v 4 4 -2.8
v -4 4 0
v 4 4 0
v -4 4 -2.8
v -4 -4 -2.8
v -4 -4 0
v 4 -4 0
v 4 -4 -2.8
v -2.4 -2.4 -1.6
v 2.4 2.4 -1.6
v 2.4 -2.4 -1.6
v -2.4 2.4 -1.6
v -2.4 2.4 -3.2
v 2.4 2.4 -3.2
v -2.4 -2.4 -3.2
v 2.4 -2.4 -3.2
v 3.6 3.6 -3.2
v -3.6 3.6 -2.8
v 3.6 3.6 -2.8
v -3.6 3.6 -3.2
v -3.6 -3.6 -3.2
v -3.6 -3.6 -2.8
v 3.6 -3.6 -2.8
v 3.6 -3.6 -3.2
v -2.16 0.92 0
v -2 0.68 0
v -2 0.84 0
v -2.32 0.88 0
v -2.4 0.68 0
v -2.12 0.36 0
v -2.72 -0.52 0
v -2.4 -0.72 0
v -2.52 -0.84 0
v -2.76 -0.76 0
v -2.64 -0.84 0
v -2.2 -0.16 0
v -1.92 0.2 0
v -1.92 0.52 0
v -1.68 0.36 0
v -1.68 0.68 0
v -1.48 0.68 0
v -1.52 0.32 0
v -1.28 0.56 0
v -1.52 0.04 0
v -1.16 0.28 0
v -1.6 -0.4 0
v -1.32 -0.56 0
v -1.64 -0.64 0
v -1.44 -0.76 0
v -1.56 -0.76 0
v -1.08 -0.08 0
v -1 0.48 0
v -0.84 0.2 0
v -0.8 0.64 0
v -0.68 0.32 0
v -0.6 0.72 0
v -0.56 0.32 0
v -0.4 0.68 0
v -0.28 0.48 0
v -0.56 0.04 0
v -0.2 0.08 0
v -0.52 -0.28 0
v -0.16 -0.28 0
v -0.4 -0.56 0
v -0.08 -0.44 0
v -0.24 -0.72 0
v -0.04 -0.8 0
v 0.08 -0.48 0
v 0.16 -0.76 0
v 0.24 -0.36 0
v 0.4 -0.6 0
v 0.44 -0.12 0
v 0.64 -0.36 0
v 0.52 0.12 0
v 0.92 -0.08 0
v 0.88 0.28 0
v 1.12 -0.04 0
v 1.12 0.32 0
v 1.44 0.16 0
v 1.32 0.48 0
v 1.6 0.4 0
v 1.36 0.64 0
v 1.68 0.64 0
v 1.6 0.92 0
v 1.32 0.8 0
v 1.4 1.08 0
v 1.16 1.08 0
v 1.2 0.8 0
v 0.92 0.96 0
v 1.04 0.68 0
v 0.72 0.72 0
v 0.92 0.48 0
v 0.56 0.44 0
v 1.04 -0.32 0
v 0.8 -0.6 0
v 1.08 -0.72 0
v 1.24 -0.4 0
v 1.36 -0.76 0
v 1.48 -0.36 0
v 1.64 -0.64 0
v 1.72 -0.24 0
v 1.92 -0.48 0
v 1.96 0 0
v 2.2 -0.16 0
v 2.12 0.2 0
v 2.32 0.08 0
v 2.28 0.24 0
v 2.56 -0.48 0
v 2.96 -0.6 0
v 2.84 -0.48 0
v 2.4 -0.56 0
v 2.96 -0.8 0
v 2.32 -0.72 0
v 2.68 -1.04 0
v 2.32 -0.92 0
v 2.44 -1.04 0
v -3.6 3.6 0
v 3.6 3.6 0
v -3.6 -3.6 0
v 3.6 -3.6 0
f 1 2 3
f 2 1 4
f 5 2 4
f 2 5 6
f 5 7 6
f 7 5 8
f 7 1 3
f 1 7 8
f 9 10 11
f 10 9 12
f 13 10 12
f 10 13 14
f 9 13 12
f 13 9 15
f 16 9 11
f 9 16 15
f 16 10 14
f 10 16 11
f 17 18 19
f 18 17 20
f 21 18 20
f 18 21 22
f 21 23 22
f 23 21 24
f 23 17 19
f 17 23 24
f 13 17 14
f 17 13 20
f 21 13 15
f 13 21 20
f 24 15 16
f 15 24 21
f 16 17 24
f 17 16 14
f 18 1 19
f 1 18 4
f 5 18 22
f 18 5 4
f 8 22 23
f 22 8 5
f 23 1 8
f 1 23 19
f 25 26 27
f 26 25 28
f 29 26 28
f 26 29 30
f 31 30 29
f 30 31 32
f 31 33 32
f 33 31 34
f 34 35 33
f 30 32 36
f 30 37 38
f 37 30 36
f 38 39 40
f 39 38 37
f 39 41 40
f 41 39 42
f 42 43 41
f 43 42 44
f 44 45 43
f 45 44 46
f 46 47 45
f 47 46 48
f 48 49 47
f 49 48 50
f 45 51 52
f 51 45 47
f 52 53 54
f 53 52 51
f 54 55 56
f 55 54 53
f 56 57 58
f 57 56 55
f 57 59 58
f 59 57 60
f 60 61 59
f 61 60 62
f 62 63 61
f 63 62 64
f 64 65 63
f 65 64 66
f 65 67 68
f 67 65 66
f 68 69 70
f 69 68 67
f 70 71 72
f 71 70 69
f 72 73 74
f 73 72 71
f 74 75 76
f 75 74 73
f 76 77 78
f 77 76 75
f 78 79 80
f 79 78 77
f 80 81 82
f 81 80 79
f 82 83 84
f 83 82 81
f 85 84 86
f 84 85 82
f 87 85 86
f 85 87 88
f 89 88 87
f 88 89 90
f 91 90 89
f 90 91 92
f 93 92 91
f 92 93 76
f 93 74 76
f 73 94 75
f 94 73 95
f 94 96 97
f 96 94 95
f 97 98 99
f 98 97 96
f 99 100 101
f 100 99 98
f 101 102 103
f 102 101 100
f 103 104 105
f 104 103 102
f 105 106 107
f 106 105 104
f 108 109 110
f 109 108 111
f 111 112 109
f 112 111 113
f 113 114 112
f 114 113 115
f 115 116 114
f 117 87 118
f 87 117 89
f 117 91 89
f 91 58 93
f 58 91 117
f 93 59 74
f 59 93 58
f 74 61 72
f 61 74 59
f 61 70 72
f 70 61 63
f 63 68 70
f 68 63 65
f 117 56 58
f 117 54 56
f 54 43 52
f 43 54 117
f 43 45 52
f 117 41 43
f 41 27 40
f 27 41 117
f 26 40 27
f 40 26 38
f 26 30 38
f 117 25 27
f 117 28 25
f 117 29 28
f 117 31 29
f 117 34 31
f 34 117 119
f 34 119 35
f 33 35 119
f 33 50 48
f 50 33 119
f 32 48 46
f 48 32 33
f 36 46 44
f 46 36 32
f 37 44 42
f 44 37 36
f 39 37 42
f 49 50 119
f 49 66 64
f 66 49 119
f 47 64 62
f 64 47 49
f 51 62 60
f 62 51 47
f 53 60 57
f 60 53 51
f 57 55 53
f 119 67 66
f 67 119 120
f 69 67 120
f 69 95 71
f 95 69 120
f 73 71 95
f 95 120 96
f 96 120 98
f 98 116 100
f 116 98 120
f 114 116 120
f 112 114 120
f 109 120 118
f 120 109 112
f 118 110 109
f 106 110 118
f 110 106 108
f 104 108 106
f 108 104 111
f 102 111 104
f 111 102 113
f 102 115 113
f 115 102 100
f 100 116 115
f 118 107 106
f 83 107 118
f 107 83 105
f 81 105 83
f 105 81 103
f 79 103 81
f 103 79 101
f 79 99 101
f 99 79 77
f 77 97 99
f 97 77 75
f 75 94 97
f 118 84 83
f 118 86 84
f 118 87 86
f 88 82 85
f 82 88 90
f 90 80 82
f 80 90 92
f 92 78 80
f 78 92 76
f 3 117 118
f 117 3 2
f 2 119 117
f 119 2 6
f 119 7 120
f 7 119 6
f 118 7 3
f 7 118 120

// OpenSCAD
// file: ../p/box5.scad
use <../lib.scad>
function ldraw_lib__box5() = [
// 0 Box with 5 Faces and All Edges
// 0 Name: box5.dat
// 0 Author: James Jessiman
// 0 !LDRAW_ORG Primitive UPDATE 2012-01
// 0 !LICENSE Licensed under CC BY 2.0 and CC BY 4.0 : see CAreadme.txt
// 
// 0 BFC CERTIFY CCW
  [0,"BFC","CERTIFY"],
  [0,"BFC","CCW"],
// 
// 0 !HISTORY 2002-04-03 [sbliss] Modified for BFC compliance
// 0 !HISTORY 2002-04-25 [PTadmin] Official Update 2002-02
// 0 !HISTORY 2007-06-24 [PTadmin] Header formatted for Contributor Agreement
// 0 !HISTORY 2008-07-01 [PTadmin] Official Update 2008-01
// 0 !HISTORY 2012-02-16 [Philo] Changed to CCW
// 0 !HISTORY 2012-03-30 [PTadmin] Official Update 2012-01
// 
// 
// 2 24 1 1 1 -1 1 1
  [2,24,1,1,1,-1,1,1],
// 2 24 -1 1 1 -1 1 -1
  [2,24,-1,1,1,-1,1,-1],
// 2 24 -1 1 -1 1 1 -1
  [2,24,-1,1,-1,1,1,-1],
// 2 24 1 1 -1 1 1 1
  [2,24,1,1,-1,1,1,1],
// 2 24 1 0 1 -1 0 1
  [2,24,1,0,1,-1,0,1],
// 2 24 -1 0 1 -1 0 -1
  [2,24,-1,0,1,-1,0,-1],
// 2 24 -1 0 -1 1 0 -1
  [2,24,-1,0,-1,1,0,-1],
// 2 24 1 0 -1 1 0 1
  [2,24,1,0,-1,1,0,1],
// 2 24 1 0 1 1 1 1
  [2,24,1,0,1,1,1,1],
// 2 24 -1 0 1 -1 1 1
  [2,24,-1,0,1,-1,1,1],
// 2 24 1 0 -1 1 1 -1
  [2,24,1,0,-1,1,1,-1],
// 2 24 -1 0 -1 -1 1 -1
  [2,24,-1,0,-1,-1,1,-1],
// 4 16 -1 1 1 1 1 1 1 1 -1 -1 1 -1
  [4,16,-1,1,1,1,1,1,1,1,-1,-1,1,-1],
// 4 16 -1 1 1 -1 0 1 1 0 1 1 1 1
  [4,16,-1,1,1,-1,0,1,1,0,1,1,1,1],
// 4 16 -1 1 -1 -1 0 -1 -1 0 1 -1 1 1
  [4,16,-1,1,-1,-1,0,-1,-1,0,1,-1,1,1],
// 4 16 1 1 -1 1 0 -1 -1 0 -1 -1 1 -1
  [4,16,1,1,-1,1,0,-1,-1,0,-1,-1,1,-1],
// 4 16 1 1 1 1 0 1 1 0 -1 1 1 -1
  [4,16,1,1,1,1,0,1,1,0,-1,1,1,-1],
];
makepoly(ldraw_lib__box5(), line=0.2);
// file: ../p/box4.scad
use <../lib.scad>
function ldraw_lib__box4() = [
// 0 Box with 4 Faces (2 Parallel Pairs) and All Edges
// 0 Name: box4.dat
// 0 Author: James Jessiman
// 0 !LDRAW_ORG Primitive UPDATE 2012-01
// 0 !LICENSE Licensed under CC BY 2.0 and CC BY 4.0 : see CAreadme.txt
// 
// 0 BFC CERTIFY CCW
  [0,"BFC","CERTIFY"],
  [0,"BFC","CCW"],
// 
// 0 !HISTORY 2002-04-03 [sbliss] Modified for BFC compliance
// 0 !HISTORY 2002-04-25 [PTadmin] Official Update 2002-02
// 0 !HISTORY 2007-06-24 [PTadmin] Header formatted for Contributor Agreement
// 0 !HISTORY 2008-07-01 [PTadmin] Official Update 2008-01
// 0 !HISTORY 2012-02-16 [Philo] Changed to CCW
// 0 !HISTORY 2012-03-30 [PTadmin] Official Update 2012-01
// 
// 
// 2 24 1 1 1 -1 1 1
  [2,24,1,1,1,-1,1,1],
// 2 24 -1 1 1 -1 1 -1
  [2,24,-1,1,1,-1,1,-1],
// 2 24 -1 1 -1 1 1 -1
  [2,24,-1,1,-1,1,1,-1],
// 2 24 1 1 -1 1 1 1
  [2,24,1,1,-1,1,1,1],
// 2 24 1 0 1 -1 0 1
  [2,24,1,0,1,-1,0,1],
// 2 24 -1 0 1 -1 0 -1
  [2,24,-1,0,1,-1,0,-1],
// 2 24 -1 0 -1 1 0 -1
  [2,24,-1,0,-1,1,0,-1],
// 2 24 1 0 -1 1 0 1
  [2,24,1,0,-1,1,0,1],
// 2 24 1 0 1 1 1 1
  [2,24,1,0,1,1,1,1],
// 2 24 -1 0 1 -1 1 1
  [2,24,-1,0,1,-1,1,1],
// 2 24 1 0 -1 1 1 -1
  [2,24,1,0,-1,1,1,-1],
// 2 24 -1 0 -1 -1 1 -1
  [2,24,-1,0,-1,-1,1,-1],
// 4 16 -1 1 1 -1 0 1 1 0 1 1 1 1
  [4,16,-1,1,1,-1,0,1,1,0,1,1,1,1],
// 4 16 -1 1 -1 -1 0 -1 -1 0 1 -1 1 1
  [4,16,-1,1,-1,-1,0,-1,-1,0,1,-1,1,1],
// 4 16 1 1 -1 1 0 -1 -1 0 -1 -1 1 -1
  [4,16,1,1,-1,1,0,-1,-1,0,-1,-1,1,-1],
// 4 16 1 1 1 1 0 1 1 0 -1 1 1 -1
  [4,16,1,1,1,1,0,1,1,0,-1,1,1,-1],
];
makepoly(ldraw_lib__box4(), line=0.2);
// file: s/3070bs01.scad
use <../../lib.scad>
use <../../p/box4.scad>
use <../../p/box5.scad>
function ldraw_lib__s__3070bs01() = [
// 0 ~Tile  1 x  1 with Groove without Top Face
// 0 Name: s\3070bs01.dat
// 0 Author: Chris Dee [cwdee]
// 0 !LDRAW_ORG Subpart UPDATE 2009-02
// 0 !LICENSE Licensed under CC BY 2.0 and CC BY 4.0 : see CAreadme.txt
// 
// 0 BFC CERTIFY CCW
  [0,"BFC","CERTIFY"],
  [0,"BFC","CCW"],
// 
// 0 !HISTORY 2009-09-03 [PTadmin] Official Update 2009-02
// 
// 
// 1 16 0 0 0 10 0 0 0 7 0 0 0 10 box4.dat
  [1,16,0,0,0,10,0,0,0,7,0,0,0,10, ldraw_lib__box4()],
// 0 BFC INVERTNEXT
  [0,"BFC","INVERTNEXT"],
// 1 16 0 8 0 6 0 0 0 -4 0 0 0 6 box5.dat
  [1,16,0,8,0,6,0,0,0,-4,0,0,0,6, ldraw_lib__box5()],
// 1 16 0 7 0 9 0 0 0 1 0 0 0 9 box4.dat
  [1,16,0,7,0,9,0,0,0,1,0,0,0,9, ldraw_lib__box4()],
// 
// 4 16 9 8 9 6 8 6 -6 8 6 -9 8 9
  [4,16,9,8,9,6,8,6,-6,8,6,-9,8,9],
// 4 16 -9 8 9 -6 8 6 -6 8 -6 -9 8 -9
  [4,16,-9,8,9,-6,8,6,-6,8,-6,-9,8,-9],
// 4 16 -9 8 -9 -6 8 -6 6 8 -6 9 8 -9
  [4,16,-9,8,-9,-6,8,-6,6,8,-6,9,8,-9],
// 4 16 9 8 -9 6 8 -6 6 8 6 9 8 9
  [4,16,9,8,-9,6,8,-6,6,8,6,9,8,9],
// 
// 4 16 10 7 10 9 7 9 -9 7 9 -10 7 10
  [4,16,10,7,10,9,7,9,-9,7,9,-10,7,10],
// 4 16 -10 7 10 -9 7 9 -9 7 -9 -10 7 -10
  [4,16,-10,7,10,-9,7,9,-9,7,-9,-10,7,-10],
// 4 16 -10 7 -10 -9 7 -9 9 7 -9 10 7 -10
  [4,16,-10,7,-10,-9,7,-9,9,7,-9,10,7,-10],
// 4 16 10 7 -10 9 7 -9 9 7 9 10 7 10
  [4,16,10,7,-10,9,7,-9,9,7,9,10,7,10],
// 0
];
makepoly(ldraw_lib__s__3070bs01(), line=0.2);
// main file
use <../lib.scad>
use <s/3070bs01.scad>
function ldraw_lib__3070bp14() = [
// 0 Tile  1 x  1 with Yellow "me." Script on Magenta Background Pattern
// 0 Name: 3070bp14.dat
// 0 Author: Takeshi Takahashi [RainbowDolphin]
// 0 !LDRAW_ORG Part UPDATE 2022-01
// 0 !LICENSE Licensed under CC BY 2.0 and CC BY 4.0 : see CAreadme.txt
// 
// 0 BFC CERTIFY CCW
  [0,"BFC","CERTIFY"],
  [0,"BFC","CCW"],
// 
// 0 !KEYWORDS Bricklink 3070bpb144, Dots, Set 41916
// 
// 0 !HISTORY 2022-01-14 [PTadmin] Official Update 2022-01
// 
// 
// 1 16 0 0 0 1 0 0 0 1 0 0 0 1 s\3070bs01.dat
  [1,16,0,0,0,1,0,0,0,1,0,0,0,1, ldraw_lib__s__3070bs01()],
// 4 14 -5 0 2.1 -5.4 0 2.3 -5.8 0 2.2 -5 0 1.7
  [4,14,-5,0,2.1,-5.4,0,2.3,-5.8,0,2.2,-5,0,1.7],
// 4 14 -5 0 1.7 -5.8 0 2.2 -6 0 1.7 -5.3 0 0.9
  [4,14,-5,0,1.7,-5.8,0,2.2,-6,0,1.7,-5.3,0,0.9],
// 4 14 -5.3 0 0.9 -6 0 1.7 -6.8 0 -1.3 -6 0 -1.8
  [4,14,-5.3,0,0.9,-6,0,1.7,-6.8,0,-1.3,-6,0,-1.8],
// 4 14 -6 0 -1.8 -6.8 0 -1.3 -6.9 0 -1.9 -6.3 0 -2.1
  [4,14,-6,0,-1.8,-6.8,0,-1.3,-6.9,0,-1.9,-6.3,0,-2.1],
// 3 14 -6.9 0 -1.9 -6.6 0 -2.1 -6.3 0 -2.1
  [3,14,-6.9,0,-1.9,-6.6,0,-2.1,-6.3,0,-2.1],
// 3 14 -5.3 0 0.9 -6 0 -1.8 -5.5 0 -0.4
  [3,14,-5.3,0,0.9,-6,0,-1.8,-5.5,0,-0.4],
// 4 14 -4.8 0 1.3 -5.3 0 0.9 -5.5 0 -0.4 -4.8 0 0.5
  [4,14,-4.8,0,1.3,-5.3,0,0.9,-5.5,0,-0.4,-4.8,0,0.5],
// 4 14 -4.2 0 1.7 -4.8 0 1.3 -4.8 0 0.5 -4.2 0 0.9
  [4,14,-4.2,0,1.7,-4.8,0,1.3,-4.8,0,0.5,-4.2,0,0.9],
// 4 14 -3.7 0 1.7 -4.2 0 1.7 -4.2 0 0.9 -3.8 0 0.8
  [4,14,-3.7,0,1.7,-4.2,0,1.7,-4.2,0,0.9,-3.8,0,0.8],
// 4 14 -3.2 0 1.4 -3.7 0 1.7 -3.8 0 0.8 -3.8 0 0.1
  [4,14,-3.2,0,1.4,-3.7,0,1.7,-3.8,0,0.8,-3.8,0,0.1],
// 4 14 -2.9 0 0.7 -3.2 0 1.4 -3.8 0 0.1 -4 0 -1
  [4,14,-2.9,0,0.7,-3.2,0,1.4,-3.8,0,0.1,-4,0,-1],
// 4 14 -3.3 0 -1.4 -2.9 0 0.7 -4 0 -1 -4.1 0 -1.6
  [4,14,-3.3,0,-1.4,-2.9,0,0.7,-4,0,-1,-4.1,0,-1.6],
// 4 14 -3.6 0 -1.9 -3.3 0 -1.4 -4.1 0 -1.6 -3.9 0 -1.9
  [4,14,-3.6,0,-1.9,-3.3,0,-1.4,-4.1,0,-1.6,-3.9,0,-1.9],
// 4 14 -2.9 0 0.7 -3.3 0 -1.4 -2.7 0 -0.2 -2.5 0 1.2
  [4,14,-2.9,0,0.7,-3.3,0,-1.4,-2.7,0,-0.2,-2.5,0,1.2],
// 4 14 -2.5 0 1.2 -2.7 0 -0.2 -2.1 0 0.5 -2 0 1.6
  [4,14,-2.5,0,1.2,-2.7,0,-0.2,-2.1,0,0.5,-2,0,1.6],
// 4 14 -2 0 1.6 -2.1 0 0.5 -1.7 0 0.8 -1.5 0 1.8
  [4,14,-2,0,1.6,-2.1,0,0.5,-1.7,0,0.8,-1.5,0,1.8],
// 4 14 -1.5 0 1.8 -1.7 0 0.8 -1.4 0 0.8 -1 0 1.7
  [4,14,-1.5,0,1.8,-1.7,0,0.8,-1.4,0,0.8,-1,0,1.7],
// 4 14 -0.7 0 1.2 -1 0 1.7 -1.4 0 0.8 -1.4 0 0.1
  [4,14,-0.7,0,1.2,-1,0,1.7,-1.4,0,0.8,-1.4,0,0.1],
// 4 14 -0.5 0 0.2 -0.7 0 1.2 -1.4 0 0.1 -1.3 0 -0.7
  [4,14,-0.5,0,0.2,-0.7,0,1.2,-1.4,0,0.1,-1.3,0,-0.7],
// 4 14 -0.4 0 -0.7 -0.5 0 0.2 -1.3 0 -0.7 -1 0 -1.4
  [4,14,-0.4,0,-0.7,-0.5,0,0.2,-1.3,0,-0.7,-1,0,-1.4],
// 4 14 -0.2 0 -1.1 -0.4 0 -0.7 -1 0 -1.4 -0.6 0 -1.8
  [4,14,-0.2,0,-1.1,-0.4,0,-0.7,-1,0,-1.4,-0.6,0,-1.8],
// 4 14 -0.2 0 -1.1 -0.6 0 -1.8 -0.1 0 -2 0.2 0 -1.2
  [4,14,-0.2,0,-1.1,-0.6,0,-1.8,-0.1,0,-2,0.2,0,-1.2],
// 4 14 0.2 0 -1.2 -0.1 0 -2 0.4 0 -1.9 0.6 0 -0.9
  [4,14,0.2,0,-1.2,-0.1,0,-2,0.4,0,-1.9,0.6,0,-0.9],
// 4 14 0.6 0 -0.9 0.4 0 -1.9 1 0 -1.5 1.1 0 -0.3
  [4,14,0.6,0,-0.9,0.4,0,-1.9,1,0,-1.5,1.1,0,-0.3],
// 4 14 1.1 0 -0.3 1 0 -1.5 1.6 0 -0.9 1.3 0 0.3
  [4,14,1.1,0,-0.3,1,0,-1.5,1.6,0,-0.9,1.3,0,0.3],
// 4 14 1.3 0 0.3 1.6 0 -0.9 2.3 0 -0.2 2.2 0 0.7
  [4,14,1.3,0,0.3,1.6,0,-0.9,2.3,0,-0.2,2.2,0,0.7],
// 4 14 2.2 0 0.7 2.3 0 -0.2 2.8 0 -0.1 2.8 0 0.8
  [4,14,2.2,0,0.7,2.3,0,-0.2,2.8,0,-0.1,2.8,0,0.8],
// 4 14 2.8 0 0.8 2.8 0 -0.1 3.6 0 0.4 3.3 0 1.2
  [4,14,2.8,0,0.8,2.8,0,-0.1,3.6,0,0.4,3.3,0,1.2],
// 4 14 3.3 0 1.2 3.6 0 0.4 4 0 1 3.4 0 1.6
  [4,14,3.3,0,1.2,3.6,0,0.4,4,0,1,3.4,0,1.6],
// 4 14 3.4 0 1.6 4 0 1 4.2 0 1.6 4 0 2.3
  [4,14,3.4,0,1.6,4,0,1,4.2,0,1.6,4,0,2.3],
// 4 14 3.3 0 2 3.4 0 1.6 4 0 2.3 3.5 0 2.7
  [4,14,3.3,0,2,3.4,0,1.6,4,0,2.3,3.5,0,2.7],
// 4 14 3 0 2 3.3 0 2 3.5 0 2.7 2.9 0 2.7
  [4,14,3,0,2,3.3,0,2,3.5,0,2.7,2.9,0,2.7],
// 4 14 3 0 2 2.9 0 2.7 2.3 0 2.4 2.6 0 1.7
  [4,14,3,0,2,2.9,0,2.7,2.3,0,2.4,2.6,0,1.7],
// 4 14 2.6 0 1.7 2.3 0 2.4 1.8 0 1.8 2.3 0 1.2
  [4,14,2.6,0,1.7,2.3,0,2.4,1.8,0,1.8,2.3,0,1.2],
// 4 14 2.3 0 1.2 1.8 0 1.8 1.4 0 1.1 2.2 0 0.7
  [4,14,2.3,0,1.2,1.8,0,1.8,1.4,0,1.1,2.2,0,0.7],
// 3 14 1.4 0 1.1 1.3 0 0.3 2.2 0 0.7
  [3,14,1.4,0,1.1,1.3,0,0.3,2.2,0,0.7],
// 4 14 2.3 0 -0.2 1.6 0 -0.9 2 0 -1.5 2.6 0 -0.8
  [4,14,2.3,0,-0.2,1.6,0,-0.9,2,0,-1.5,2.6,0,-0.8],
// 4 14 2.6 0 -0.8 2 0 -1.5 2.7 0 -1.8 3.1 0 -1
  [4,14,2.6,0,-0.8,2,0,-1.5,2.7,0,-1.8,3.1,0,-1],
// 4 14 3.1 0 -1 2.7 0 -1.8 3.4 0 -1.9 3.7 0 -0.9
  [4,14,3.1,0,-1,2.7,0,-1.8,3.4,0,-1.9,3.7,0,-0.9],
// 4 14 3.7 0 -0.9 3.4 0 -1.9 4.1 0 -1.6 4.3 0 -0.6
  [4,14,3.7,0,-0.9,3.4,0,-1.9,4.1,0,-1.6,4.3,0,-0.6],
// 4 14 4.3 0 -0.6 4.1 0 -1.6 4.8 0 -1.2 4.9 0 0
  [4,14,4.3,0,-0.6,4.1,0,-1.6,4.8,0,-1.2,4.9,0,0],
// 4 14 4.9 0 0 4.8 0 -1.2 5.5 0 -0.4 5.3 0 0.5
  [4,14,4.9,0,0,4.8,0,-1.2,5.5,0,-0.4,5.3,0,0.5],
// 4 14 5.3 0 0.5 5.5 0 -0.4 5.8 0 0.2 5.7 0 0.6
  [4,14,5.3,0,0.5,5.5,0,-0.4,5.8,0,0.2,5.7,0,0.6],
// 4 14 7.1 0 -1.2 6.4 0 -1.2 6 0 -1.4 7.4 0 -1.5
  [4,14,7.1,0,-1.2,6.4,0,-1.2,6,0,-1.4,7.4,0,-1.5],
// 4 14 7.4 0 -1.5 6 0 -1.4 5.8 0 -1.8 7.4 0 -2
  [4,14,7.4,0,-1.5,6,0,-1.4,5.8,0,-1.8,7.4,0,-2],
// 4 14 7.4 0 -2 5.8 0 -1.8 5.8 0 -2.3 6.7 0 -2.6
  [4,14,7.4,0,-2,5.8,0,-1.8,5.8,0,-2.3,6.7,0,-2.6],
// 3 14 5.8 0 -2.3 6.1 0 -2.6 6.7 0 -2.6
  [3,14,5.8,0,-2.3,6.1,0,-2.6,6.7,0,-2.6],
// 4 26 2.9 0 2.7 9 0 9 -9 0 9 2.3 0 2.4
  [4,26,2.9,0,2.7,9,0,9,-9,0,9,2.3,0,2.4],
// 3 26 -9 0 9 1.8 0 1.8 2.3 0 2.4
  [3,26,-9,0,9,1.8,0,1.8,2.3,0,2.4],
// 4 26 1.4 0 1.1 1.8 0 1.8 -9 0 9 -1 0 1.7
  [4,26,1.4,0,1.1,1.8,0,1.8,-9,0,9,-1,0,1.7],
// 4 26 1.4 0 1.1 -1 0 1.7 -0.7 0 1.2 1.3 0 0.3
  [4,26,1.4,0,1.1,-1,0,1.7,-0.7,0,1.2,1.3,0,0.3],
// 4 26 1.3 0 0.3 -0.7 0 1.2 -0.5 0 0.2 1.1 0 -0.3
  [4,26,1.3,0,0.3,-0.7,0,1.2,-0.5,0,0.2,1.1,0,-0.3],
// 4 26 1.1 0 -0.3 -0.5 0 0.2 -0.4 0 -0.7 0.6 0 -0.9
  [4,26,1.1,0,-0.3,-0.5,0,0.2,-0.4,0,-0.7,0.6,0,-0.9],
// 4 26 0.6 0 -0.9 -0.4 0 -0.7 -0.2 0 -1.1 0.2 0 -1.2
  [4,26,0.6,0,-0.9,-0.4,0,-0.7,-0.2,0,-1.1,0.2,0,-1.2],
// 3 26 -9 0 9 -1.5 0 1.8 -1 0 1.7
  [3,26,-9,0,9,-1.5,0,1.8,-1,0,1.7],
// 3 26 -9 0 9 -2 0 1.6 -1.5 0 1.8
  [3,26,-9,0,9,-2,0,1.6,-1.5,0,1.8],
// 4 26 -2.5 0 1.2 -2 0 1.6 -9 0 9 -3.2 0 1.4
  [4,26,-2.5,0,1.2,-2,0,1.6,-9,0,9,-3.2,0,1.4],
// 3 26 -3.2 0 1.4 -2.9 0 0.7 -2.5 0 1.2
  [3,26,-3.2,0,1.4,-2.9,0,0.7,-2.5,0,1.2],
// 3 26 -9 0 9 -3.7 0 1.7 -3.2 0 1.4
  [3,26,-9,0,9,-3.7,0,1.7,-3.2,0,1.4],
// 4 26 -4.2 0 1.7 -3.7 0 1.7 -9 0 9 -5 0 2.1
  [4,26,-4.2,0,1.7,-3.7,0,1.7,-9,0,9,-5,0,2.1],
// 4 26 -4.2 0 1.7 -5 0 2.1 -5 0 1.7 -4.8 0 1.3
  [4,26,-4.2,0,1.7,-5,0,2.1,-5,0,1.7,-4.8,0,1.3],
// 3 26 -5 0 1.7 -5.3 0 0.9 -4.8 0 1.3
  [3,26,-5,0,1.7,-5.3,0,0.9,-4.8,0,1.3],
// 3 26 -9 0 9 -5.4 0 2.3 -5 0 2.1
  [3,26,-9,0,9,-5.4,0,2.3,-5,0,2.1],
// 3 26 -9 0 9 -5.8 0 2.2 -5.4 0 2.3
  [3,26,-9,0,9,-5.8,0,2.2,-5.4,0,2.3],
// 3 26 -9 0 9 -6 0 1.7 -5.8 0 2.2
  [3,26,-9,0,9,-6,0,1.7,-5.8,0,2.2],
// 3 26 -9 0 9 -6.8 0 -1.3 -6 0 1.7
  [3,26,-9,0,9,-6.8,0,-1.3,-6,0,1.7],
// 4 26 -6.9 0 -1.9 -6.8 0 -1.3 -9 0 9 -9 0 -9
  [4,26,-6.9,0,-1.9,-6.8,0,-1.3,-9,0,9,-9,0,-9],
// 3 26 -6.9 0 -1.9 -9 0 -9 -6.6 0 -2.1
  [3,26,-6.9,0,-1.9,-9,0,-9,-6.6,0,-2.1],
// 3 26 -6.3 0 -2.1 -6.6 0 -2.1 -9 0 -9
  [3,26,-6.3,0,-2.1,-6.6,0,-2.1,-9,0,-9],
// 4 26 -6.3 0 -2.1 -9 0 -9 -3.9 0 -1.9 -4.1 0 -1.6
  [4,26,-6.3,0,-2.1,-9,0,-9,-3.9,0,-1.9,-4.1,0,-1.6],
// 4 26 -6 0 -1.8 -6.3 0 -2.1 -4.1 0 -1.6 -4 0 -1
  [4,26,-6,0,-1.8,-6.3,0,-2.1,-4.1,0,-1.6,-4,0,-1],
// 4 26 -5.5 0 -0.4 -6 0 -1.8 -4 0 -1 -3.8 0 0.1
  [4,26,-5.5,0,-0.4,-6,0,-1.8,-4,0,-1,-3.8,0,0.1],
// 4 26 -4.8 0 0.5 -5.5 0 -0.4 -3.8 0 0.1 -3.8 0 0.8
  [4,26,-4.8,0,0.5,-5.5,0,-0.4,-3.8,0,0.1,-3.8,0,0.8],
// 3 26 -4.2 0 0.9 -4.8 0 0.5 -3.8 0 0.8
  [3,26,-4.2,0,0.9,-4.8,0,0.5,-3.8,0,0.8],
// 3 26 -3.6 0 -1.9 -3.9 0 -1.9 -9 0 -9
  [3,26,-3.6,0,-1.9,-3.9,0,-1.9,-9,0,-9],
// 4 26 -3.6 0 -1.9 -9 0 -9 -0.6 0 -1.8 -1 0 -1.4
  [4,26,-3.6,0,-1.9,-9,0,-9,-0.6,0,-1.8,-1,0,-1.4],
// 4 26 -3.3 0 -1.4 -3.6 0 -1.9 -1 0 -1.4 -1.3 0 -0.7
  [4,26,-3.3,0,-1.4,-3.6,0,-1.9,-1,0,-1.4,-1.3,0,-0.7],
// 4 26 -2.7 0 -0.2 -3.3 0 -1.4 -1.3 0 -0.7 -1.4 0 0.1
  [4,26,-2.7,0,-0.2,-3.3,0,-1.4,-1.3,0,-0.7,-1.4,0,0.1],
// 4 26 -2.1 0 0.5 -2.7 0 -0.2 -1.4 0 0.1 -1.4 0 0.8
  [4,26,-2.1,0,0.5,-2.7,0,-0.2,-1.4,0,0.1,-1.4,0,0.8],
// 3 26 -1.4 0 0.8 -1.7 0 0.8 -2.1 0 0.5
  [3,26,-1.4,0,0.8,-1.7,0,0.8,-2.1,0,0.5],
// 4 26 -0.1 0 -2 -0.6 0 -1.8 -9 0 -9 9 0 -9
  [4,26,-0.1,0,-2,-0.6,0,-1.8,-9,0,-9,9,0,-9],
// 3 26 0.4 0 -1.9 -0.1 0 -2 9 0 -9
  [3,26,0.4,0,-1.9,-0.1,0,-2,9,0,-9],
// 4 26 1 0 -1.5 0.4 0 -1.9 9 0 -9 2 0 -1.5
  [4,26,1,0,-1.5,0.4,0,-1.9,9,0,-9,2,0,-1.5],
// 3 26 1.6 0 -0.9 1 0 -1.5 2 0 -1.5
  [3,26,1.6,0,-0.9,1,0,-1.5,2,0,-1.5],
// 3 26 2 0 -1.5 9 0 -9 2.7 0 -1.8
  [3,26,2,0,-1.5,9,0,-9,2.7,0,-1.8],
// 3 26 2.7 0 -1.8 9 0 -9 3.4 0 -1.9
  [3,26,2.7,0,-1.8,9,0,-9,3.4,0,-1.9],
// 4 26 4.1 0 -1.6 3.4 0 -1.9 9 0 -9 6.1 0 -2.6
  [4,26,4.1,0,-1.6,3.4,0,-1.9,9,0,-9,6.1,0,-2.6],
// 3 26 6.7 0 -2.6 6.1 0 -2.6 9 0 -9
  [3,26,6.7,0,-2.6,6.1,0,-2.6,9,0,-9],
// 3 26 7.4 0 -2 6.7 0 -2.6 9 0 -9
  [3,26,7.4,0,-2,6.7,0,-2.6,9,0,-9],
// 4 26 7.4 0 -1.5 7.4 0 -2 9 0 -9 9 0 9
  [4,26,7.4,0,-1.5,7.4,0,-2,9,0,-9,9,0,9],
// 3 26 9 0 9 7.1 0 -1.2 7.4 0 -1.5
  [3,26,9,0,9,7.1,0,-1.2,7.4,0,-1.5],
// 4 26 6.4 0 -1.2 7.1 0 -1.2 9 0 9 5.8 0 0.2
  [4,26,6.4,0,-1.2,7.1,0,-1.2,9,0,9,5.8,0,0.2],
// 4 26 6 0 -1.4 6.4 0 -1.2 5.8 0 0.2 5.5 0 -0.4
  [4,26,6,0,-1.4,6.4,0,-1.2,5.8,0,0.2,5.5,0,-0.4],
// 4 26 5.8 0 -1.8 6 0 -1.4 5.5 0 -0.4 4.8 0 -1.2
  [4,26,5.8,0,-1.8,6,0,-1.4,5.5,0,-0.4,4.8,0,-1.2],
// 4 26 5.8 0 -2.3 5.8 0 -1.8 4.8 0 -1.2 4.1 0 -1.6
  [4,26,5.8,0,-2.3,5.8,0,-1.8,4.8,0,-1.2,4.1,0,-1.6],
// 3 26 4.1 0 -1.6 6.1 0 -2.6 5.8 0 -2.3
  [3,26,4.1,0,-1.6,6.1,0,-2.6,5.8,0,-2.3],
// 3 26 9 0 9 5.7 0 0.6 5.8 0 0.2
  [3,26,9,0,9,5.7,0,0.6,5.8,0,0.2],
// 4 26 5.7 0 0.6 9 0 9 4.2 0 1.6 5.3 0 0.5
  [4,26,5.7,0,0.6,9,0,9,4.2,0,1.6,5.3,0,0.5],
// 4 26 5.3 0 0.5 4.2 0 1.6 4 0 1 4.9 0 0
  [4,26,5.3,0,0.5,4.2,0,1.6,4,0,1,4.9,0,0],
// 4 26 4.9 0 0 4 0 1 3.6 0 0.4 4.3 0 -0.6
  [4,26,4.9,0,0,4,0,1,3.6,0,0.4,4.3,0,-0.6],
// 4 26 4.3 0 -0.6 3.6 0 0.4 2.8 0 -0.1 3.7 0 -0.9
  [4,26,4.3,0,-0.6,3.6,0,0.4,2.8,0,-0.1,3.7,0,-0.9],
// 4 26 3.7 0 -0.9 2.8 0 -0.1 2.3 0 -0.2 3.1 0 -1
  [4,26,3.7,0,-0.9,2.8,0,-0.1,2.3,0,-0.2,3.1,0,-1],
// 3 26 2.3 0 -0.2 2.6 0 -0.8 3.1 0 -1
  [3,26,2.3,0,-0.2,2.6,0,-0.8,3.1,0,-1],
// 3 26 9 0 9 4 0 2.3 4.2 0 1.6
  [3,26,9,0,9,4,0,2.3,4.2,0,1.6],
// 3 26 9 0 9 3.5 0 2.7 4 0 2.3
  [3,26,9,0,9,3.5,0,2.7,4,0,2.3],
// 3 26 9 0 9 2.9 0 2.7 3.5 0 2.7
  [3,26,9,0,9,2.9,0,2.7,3.5,0,2.7],
// 4 26 3.4 0 1.6 3.3 0 2 3 0 2 2.6 0 1.7
  [4,26,3.4,0,1.6,3.3,0,2,3,0,2,2.6,0,1.7],
// 4 26 3.3 0 1.2 3.4 0 1.6 2.6 0 1.7 2.3 0 1.2
  [4,26,3.3,0,1.2,3.4,0,1.6,2.6,0,1.7,2.3,0,1.2],
// 4 26 2.8 0 0.8 3.3 0 1.2 2.3 0 1.2 2.2 0 0.7
  [4,26,2.8,0,0.8,3.3,0,1.2,2.3,0,1.2,2.2,0,0.7],
// 4 16 9 0 9 10 0 10 -10 0 10 -9 0 9
  [4,16,9,0,9,10,0,10,-10,0,10,-9,0,9],
// 4 16 -9 0 9 -10 0 10 -10 0 -10 -9 0 -9
  [4,16,-9,0,9,-10,0,10,-10,0,-10,-9,0,-9],
// 4 16 -9 0 -9 -10 0 -10 10 0 -10 9 0 -9
  [4,16,-9,0,-9,-10,0,-10,10,0,-10,9,0,-9],
// 4 16 9 0 -9 10 0 -10 10 0 10 9 0 9
  [4,16,9,0,-9,10,0,-10,10,0,10,9,0,9],
];
makepoly(ldraw_lib__3070bp14(), line=0.2);
